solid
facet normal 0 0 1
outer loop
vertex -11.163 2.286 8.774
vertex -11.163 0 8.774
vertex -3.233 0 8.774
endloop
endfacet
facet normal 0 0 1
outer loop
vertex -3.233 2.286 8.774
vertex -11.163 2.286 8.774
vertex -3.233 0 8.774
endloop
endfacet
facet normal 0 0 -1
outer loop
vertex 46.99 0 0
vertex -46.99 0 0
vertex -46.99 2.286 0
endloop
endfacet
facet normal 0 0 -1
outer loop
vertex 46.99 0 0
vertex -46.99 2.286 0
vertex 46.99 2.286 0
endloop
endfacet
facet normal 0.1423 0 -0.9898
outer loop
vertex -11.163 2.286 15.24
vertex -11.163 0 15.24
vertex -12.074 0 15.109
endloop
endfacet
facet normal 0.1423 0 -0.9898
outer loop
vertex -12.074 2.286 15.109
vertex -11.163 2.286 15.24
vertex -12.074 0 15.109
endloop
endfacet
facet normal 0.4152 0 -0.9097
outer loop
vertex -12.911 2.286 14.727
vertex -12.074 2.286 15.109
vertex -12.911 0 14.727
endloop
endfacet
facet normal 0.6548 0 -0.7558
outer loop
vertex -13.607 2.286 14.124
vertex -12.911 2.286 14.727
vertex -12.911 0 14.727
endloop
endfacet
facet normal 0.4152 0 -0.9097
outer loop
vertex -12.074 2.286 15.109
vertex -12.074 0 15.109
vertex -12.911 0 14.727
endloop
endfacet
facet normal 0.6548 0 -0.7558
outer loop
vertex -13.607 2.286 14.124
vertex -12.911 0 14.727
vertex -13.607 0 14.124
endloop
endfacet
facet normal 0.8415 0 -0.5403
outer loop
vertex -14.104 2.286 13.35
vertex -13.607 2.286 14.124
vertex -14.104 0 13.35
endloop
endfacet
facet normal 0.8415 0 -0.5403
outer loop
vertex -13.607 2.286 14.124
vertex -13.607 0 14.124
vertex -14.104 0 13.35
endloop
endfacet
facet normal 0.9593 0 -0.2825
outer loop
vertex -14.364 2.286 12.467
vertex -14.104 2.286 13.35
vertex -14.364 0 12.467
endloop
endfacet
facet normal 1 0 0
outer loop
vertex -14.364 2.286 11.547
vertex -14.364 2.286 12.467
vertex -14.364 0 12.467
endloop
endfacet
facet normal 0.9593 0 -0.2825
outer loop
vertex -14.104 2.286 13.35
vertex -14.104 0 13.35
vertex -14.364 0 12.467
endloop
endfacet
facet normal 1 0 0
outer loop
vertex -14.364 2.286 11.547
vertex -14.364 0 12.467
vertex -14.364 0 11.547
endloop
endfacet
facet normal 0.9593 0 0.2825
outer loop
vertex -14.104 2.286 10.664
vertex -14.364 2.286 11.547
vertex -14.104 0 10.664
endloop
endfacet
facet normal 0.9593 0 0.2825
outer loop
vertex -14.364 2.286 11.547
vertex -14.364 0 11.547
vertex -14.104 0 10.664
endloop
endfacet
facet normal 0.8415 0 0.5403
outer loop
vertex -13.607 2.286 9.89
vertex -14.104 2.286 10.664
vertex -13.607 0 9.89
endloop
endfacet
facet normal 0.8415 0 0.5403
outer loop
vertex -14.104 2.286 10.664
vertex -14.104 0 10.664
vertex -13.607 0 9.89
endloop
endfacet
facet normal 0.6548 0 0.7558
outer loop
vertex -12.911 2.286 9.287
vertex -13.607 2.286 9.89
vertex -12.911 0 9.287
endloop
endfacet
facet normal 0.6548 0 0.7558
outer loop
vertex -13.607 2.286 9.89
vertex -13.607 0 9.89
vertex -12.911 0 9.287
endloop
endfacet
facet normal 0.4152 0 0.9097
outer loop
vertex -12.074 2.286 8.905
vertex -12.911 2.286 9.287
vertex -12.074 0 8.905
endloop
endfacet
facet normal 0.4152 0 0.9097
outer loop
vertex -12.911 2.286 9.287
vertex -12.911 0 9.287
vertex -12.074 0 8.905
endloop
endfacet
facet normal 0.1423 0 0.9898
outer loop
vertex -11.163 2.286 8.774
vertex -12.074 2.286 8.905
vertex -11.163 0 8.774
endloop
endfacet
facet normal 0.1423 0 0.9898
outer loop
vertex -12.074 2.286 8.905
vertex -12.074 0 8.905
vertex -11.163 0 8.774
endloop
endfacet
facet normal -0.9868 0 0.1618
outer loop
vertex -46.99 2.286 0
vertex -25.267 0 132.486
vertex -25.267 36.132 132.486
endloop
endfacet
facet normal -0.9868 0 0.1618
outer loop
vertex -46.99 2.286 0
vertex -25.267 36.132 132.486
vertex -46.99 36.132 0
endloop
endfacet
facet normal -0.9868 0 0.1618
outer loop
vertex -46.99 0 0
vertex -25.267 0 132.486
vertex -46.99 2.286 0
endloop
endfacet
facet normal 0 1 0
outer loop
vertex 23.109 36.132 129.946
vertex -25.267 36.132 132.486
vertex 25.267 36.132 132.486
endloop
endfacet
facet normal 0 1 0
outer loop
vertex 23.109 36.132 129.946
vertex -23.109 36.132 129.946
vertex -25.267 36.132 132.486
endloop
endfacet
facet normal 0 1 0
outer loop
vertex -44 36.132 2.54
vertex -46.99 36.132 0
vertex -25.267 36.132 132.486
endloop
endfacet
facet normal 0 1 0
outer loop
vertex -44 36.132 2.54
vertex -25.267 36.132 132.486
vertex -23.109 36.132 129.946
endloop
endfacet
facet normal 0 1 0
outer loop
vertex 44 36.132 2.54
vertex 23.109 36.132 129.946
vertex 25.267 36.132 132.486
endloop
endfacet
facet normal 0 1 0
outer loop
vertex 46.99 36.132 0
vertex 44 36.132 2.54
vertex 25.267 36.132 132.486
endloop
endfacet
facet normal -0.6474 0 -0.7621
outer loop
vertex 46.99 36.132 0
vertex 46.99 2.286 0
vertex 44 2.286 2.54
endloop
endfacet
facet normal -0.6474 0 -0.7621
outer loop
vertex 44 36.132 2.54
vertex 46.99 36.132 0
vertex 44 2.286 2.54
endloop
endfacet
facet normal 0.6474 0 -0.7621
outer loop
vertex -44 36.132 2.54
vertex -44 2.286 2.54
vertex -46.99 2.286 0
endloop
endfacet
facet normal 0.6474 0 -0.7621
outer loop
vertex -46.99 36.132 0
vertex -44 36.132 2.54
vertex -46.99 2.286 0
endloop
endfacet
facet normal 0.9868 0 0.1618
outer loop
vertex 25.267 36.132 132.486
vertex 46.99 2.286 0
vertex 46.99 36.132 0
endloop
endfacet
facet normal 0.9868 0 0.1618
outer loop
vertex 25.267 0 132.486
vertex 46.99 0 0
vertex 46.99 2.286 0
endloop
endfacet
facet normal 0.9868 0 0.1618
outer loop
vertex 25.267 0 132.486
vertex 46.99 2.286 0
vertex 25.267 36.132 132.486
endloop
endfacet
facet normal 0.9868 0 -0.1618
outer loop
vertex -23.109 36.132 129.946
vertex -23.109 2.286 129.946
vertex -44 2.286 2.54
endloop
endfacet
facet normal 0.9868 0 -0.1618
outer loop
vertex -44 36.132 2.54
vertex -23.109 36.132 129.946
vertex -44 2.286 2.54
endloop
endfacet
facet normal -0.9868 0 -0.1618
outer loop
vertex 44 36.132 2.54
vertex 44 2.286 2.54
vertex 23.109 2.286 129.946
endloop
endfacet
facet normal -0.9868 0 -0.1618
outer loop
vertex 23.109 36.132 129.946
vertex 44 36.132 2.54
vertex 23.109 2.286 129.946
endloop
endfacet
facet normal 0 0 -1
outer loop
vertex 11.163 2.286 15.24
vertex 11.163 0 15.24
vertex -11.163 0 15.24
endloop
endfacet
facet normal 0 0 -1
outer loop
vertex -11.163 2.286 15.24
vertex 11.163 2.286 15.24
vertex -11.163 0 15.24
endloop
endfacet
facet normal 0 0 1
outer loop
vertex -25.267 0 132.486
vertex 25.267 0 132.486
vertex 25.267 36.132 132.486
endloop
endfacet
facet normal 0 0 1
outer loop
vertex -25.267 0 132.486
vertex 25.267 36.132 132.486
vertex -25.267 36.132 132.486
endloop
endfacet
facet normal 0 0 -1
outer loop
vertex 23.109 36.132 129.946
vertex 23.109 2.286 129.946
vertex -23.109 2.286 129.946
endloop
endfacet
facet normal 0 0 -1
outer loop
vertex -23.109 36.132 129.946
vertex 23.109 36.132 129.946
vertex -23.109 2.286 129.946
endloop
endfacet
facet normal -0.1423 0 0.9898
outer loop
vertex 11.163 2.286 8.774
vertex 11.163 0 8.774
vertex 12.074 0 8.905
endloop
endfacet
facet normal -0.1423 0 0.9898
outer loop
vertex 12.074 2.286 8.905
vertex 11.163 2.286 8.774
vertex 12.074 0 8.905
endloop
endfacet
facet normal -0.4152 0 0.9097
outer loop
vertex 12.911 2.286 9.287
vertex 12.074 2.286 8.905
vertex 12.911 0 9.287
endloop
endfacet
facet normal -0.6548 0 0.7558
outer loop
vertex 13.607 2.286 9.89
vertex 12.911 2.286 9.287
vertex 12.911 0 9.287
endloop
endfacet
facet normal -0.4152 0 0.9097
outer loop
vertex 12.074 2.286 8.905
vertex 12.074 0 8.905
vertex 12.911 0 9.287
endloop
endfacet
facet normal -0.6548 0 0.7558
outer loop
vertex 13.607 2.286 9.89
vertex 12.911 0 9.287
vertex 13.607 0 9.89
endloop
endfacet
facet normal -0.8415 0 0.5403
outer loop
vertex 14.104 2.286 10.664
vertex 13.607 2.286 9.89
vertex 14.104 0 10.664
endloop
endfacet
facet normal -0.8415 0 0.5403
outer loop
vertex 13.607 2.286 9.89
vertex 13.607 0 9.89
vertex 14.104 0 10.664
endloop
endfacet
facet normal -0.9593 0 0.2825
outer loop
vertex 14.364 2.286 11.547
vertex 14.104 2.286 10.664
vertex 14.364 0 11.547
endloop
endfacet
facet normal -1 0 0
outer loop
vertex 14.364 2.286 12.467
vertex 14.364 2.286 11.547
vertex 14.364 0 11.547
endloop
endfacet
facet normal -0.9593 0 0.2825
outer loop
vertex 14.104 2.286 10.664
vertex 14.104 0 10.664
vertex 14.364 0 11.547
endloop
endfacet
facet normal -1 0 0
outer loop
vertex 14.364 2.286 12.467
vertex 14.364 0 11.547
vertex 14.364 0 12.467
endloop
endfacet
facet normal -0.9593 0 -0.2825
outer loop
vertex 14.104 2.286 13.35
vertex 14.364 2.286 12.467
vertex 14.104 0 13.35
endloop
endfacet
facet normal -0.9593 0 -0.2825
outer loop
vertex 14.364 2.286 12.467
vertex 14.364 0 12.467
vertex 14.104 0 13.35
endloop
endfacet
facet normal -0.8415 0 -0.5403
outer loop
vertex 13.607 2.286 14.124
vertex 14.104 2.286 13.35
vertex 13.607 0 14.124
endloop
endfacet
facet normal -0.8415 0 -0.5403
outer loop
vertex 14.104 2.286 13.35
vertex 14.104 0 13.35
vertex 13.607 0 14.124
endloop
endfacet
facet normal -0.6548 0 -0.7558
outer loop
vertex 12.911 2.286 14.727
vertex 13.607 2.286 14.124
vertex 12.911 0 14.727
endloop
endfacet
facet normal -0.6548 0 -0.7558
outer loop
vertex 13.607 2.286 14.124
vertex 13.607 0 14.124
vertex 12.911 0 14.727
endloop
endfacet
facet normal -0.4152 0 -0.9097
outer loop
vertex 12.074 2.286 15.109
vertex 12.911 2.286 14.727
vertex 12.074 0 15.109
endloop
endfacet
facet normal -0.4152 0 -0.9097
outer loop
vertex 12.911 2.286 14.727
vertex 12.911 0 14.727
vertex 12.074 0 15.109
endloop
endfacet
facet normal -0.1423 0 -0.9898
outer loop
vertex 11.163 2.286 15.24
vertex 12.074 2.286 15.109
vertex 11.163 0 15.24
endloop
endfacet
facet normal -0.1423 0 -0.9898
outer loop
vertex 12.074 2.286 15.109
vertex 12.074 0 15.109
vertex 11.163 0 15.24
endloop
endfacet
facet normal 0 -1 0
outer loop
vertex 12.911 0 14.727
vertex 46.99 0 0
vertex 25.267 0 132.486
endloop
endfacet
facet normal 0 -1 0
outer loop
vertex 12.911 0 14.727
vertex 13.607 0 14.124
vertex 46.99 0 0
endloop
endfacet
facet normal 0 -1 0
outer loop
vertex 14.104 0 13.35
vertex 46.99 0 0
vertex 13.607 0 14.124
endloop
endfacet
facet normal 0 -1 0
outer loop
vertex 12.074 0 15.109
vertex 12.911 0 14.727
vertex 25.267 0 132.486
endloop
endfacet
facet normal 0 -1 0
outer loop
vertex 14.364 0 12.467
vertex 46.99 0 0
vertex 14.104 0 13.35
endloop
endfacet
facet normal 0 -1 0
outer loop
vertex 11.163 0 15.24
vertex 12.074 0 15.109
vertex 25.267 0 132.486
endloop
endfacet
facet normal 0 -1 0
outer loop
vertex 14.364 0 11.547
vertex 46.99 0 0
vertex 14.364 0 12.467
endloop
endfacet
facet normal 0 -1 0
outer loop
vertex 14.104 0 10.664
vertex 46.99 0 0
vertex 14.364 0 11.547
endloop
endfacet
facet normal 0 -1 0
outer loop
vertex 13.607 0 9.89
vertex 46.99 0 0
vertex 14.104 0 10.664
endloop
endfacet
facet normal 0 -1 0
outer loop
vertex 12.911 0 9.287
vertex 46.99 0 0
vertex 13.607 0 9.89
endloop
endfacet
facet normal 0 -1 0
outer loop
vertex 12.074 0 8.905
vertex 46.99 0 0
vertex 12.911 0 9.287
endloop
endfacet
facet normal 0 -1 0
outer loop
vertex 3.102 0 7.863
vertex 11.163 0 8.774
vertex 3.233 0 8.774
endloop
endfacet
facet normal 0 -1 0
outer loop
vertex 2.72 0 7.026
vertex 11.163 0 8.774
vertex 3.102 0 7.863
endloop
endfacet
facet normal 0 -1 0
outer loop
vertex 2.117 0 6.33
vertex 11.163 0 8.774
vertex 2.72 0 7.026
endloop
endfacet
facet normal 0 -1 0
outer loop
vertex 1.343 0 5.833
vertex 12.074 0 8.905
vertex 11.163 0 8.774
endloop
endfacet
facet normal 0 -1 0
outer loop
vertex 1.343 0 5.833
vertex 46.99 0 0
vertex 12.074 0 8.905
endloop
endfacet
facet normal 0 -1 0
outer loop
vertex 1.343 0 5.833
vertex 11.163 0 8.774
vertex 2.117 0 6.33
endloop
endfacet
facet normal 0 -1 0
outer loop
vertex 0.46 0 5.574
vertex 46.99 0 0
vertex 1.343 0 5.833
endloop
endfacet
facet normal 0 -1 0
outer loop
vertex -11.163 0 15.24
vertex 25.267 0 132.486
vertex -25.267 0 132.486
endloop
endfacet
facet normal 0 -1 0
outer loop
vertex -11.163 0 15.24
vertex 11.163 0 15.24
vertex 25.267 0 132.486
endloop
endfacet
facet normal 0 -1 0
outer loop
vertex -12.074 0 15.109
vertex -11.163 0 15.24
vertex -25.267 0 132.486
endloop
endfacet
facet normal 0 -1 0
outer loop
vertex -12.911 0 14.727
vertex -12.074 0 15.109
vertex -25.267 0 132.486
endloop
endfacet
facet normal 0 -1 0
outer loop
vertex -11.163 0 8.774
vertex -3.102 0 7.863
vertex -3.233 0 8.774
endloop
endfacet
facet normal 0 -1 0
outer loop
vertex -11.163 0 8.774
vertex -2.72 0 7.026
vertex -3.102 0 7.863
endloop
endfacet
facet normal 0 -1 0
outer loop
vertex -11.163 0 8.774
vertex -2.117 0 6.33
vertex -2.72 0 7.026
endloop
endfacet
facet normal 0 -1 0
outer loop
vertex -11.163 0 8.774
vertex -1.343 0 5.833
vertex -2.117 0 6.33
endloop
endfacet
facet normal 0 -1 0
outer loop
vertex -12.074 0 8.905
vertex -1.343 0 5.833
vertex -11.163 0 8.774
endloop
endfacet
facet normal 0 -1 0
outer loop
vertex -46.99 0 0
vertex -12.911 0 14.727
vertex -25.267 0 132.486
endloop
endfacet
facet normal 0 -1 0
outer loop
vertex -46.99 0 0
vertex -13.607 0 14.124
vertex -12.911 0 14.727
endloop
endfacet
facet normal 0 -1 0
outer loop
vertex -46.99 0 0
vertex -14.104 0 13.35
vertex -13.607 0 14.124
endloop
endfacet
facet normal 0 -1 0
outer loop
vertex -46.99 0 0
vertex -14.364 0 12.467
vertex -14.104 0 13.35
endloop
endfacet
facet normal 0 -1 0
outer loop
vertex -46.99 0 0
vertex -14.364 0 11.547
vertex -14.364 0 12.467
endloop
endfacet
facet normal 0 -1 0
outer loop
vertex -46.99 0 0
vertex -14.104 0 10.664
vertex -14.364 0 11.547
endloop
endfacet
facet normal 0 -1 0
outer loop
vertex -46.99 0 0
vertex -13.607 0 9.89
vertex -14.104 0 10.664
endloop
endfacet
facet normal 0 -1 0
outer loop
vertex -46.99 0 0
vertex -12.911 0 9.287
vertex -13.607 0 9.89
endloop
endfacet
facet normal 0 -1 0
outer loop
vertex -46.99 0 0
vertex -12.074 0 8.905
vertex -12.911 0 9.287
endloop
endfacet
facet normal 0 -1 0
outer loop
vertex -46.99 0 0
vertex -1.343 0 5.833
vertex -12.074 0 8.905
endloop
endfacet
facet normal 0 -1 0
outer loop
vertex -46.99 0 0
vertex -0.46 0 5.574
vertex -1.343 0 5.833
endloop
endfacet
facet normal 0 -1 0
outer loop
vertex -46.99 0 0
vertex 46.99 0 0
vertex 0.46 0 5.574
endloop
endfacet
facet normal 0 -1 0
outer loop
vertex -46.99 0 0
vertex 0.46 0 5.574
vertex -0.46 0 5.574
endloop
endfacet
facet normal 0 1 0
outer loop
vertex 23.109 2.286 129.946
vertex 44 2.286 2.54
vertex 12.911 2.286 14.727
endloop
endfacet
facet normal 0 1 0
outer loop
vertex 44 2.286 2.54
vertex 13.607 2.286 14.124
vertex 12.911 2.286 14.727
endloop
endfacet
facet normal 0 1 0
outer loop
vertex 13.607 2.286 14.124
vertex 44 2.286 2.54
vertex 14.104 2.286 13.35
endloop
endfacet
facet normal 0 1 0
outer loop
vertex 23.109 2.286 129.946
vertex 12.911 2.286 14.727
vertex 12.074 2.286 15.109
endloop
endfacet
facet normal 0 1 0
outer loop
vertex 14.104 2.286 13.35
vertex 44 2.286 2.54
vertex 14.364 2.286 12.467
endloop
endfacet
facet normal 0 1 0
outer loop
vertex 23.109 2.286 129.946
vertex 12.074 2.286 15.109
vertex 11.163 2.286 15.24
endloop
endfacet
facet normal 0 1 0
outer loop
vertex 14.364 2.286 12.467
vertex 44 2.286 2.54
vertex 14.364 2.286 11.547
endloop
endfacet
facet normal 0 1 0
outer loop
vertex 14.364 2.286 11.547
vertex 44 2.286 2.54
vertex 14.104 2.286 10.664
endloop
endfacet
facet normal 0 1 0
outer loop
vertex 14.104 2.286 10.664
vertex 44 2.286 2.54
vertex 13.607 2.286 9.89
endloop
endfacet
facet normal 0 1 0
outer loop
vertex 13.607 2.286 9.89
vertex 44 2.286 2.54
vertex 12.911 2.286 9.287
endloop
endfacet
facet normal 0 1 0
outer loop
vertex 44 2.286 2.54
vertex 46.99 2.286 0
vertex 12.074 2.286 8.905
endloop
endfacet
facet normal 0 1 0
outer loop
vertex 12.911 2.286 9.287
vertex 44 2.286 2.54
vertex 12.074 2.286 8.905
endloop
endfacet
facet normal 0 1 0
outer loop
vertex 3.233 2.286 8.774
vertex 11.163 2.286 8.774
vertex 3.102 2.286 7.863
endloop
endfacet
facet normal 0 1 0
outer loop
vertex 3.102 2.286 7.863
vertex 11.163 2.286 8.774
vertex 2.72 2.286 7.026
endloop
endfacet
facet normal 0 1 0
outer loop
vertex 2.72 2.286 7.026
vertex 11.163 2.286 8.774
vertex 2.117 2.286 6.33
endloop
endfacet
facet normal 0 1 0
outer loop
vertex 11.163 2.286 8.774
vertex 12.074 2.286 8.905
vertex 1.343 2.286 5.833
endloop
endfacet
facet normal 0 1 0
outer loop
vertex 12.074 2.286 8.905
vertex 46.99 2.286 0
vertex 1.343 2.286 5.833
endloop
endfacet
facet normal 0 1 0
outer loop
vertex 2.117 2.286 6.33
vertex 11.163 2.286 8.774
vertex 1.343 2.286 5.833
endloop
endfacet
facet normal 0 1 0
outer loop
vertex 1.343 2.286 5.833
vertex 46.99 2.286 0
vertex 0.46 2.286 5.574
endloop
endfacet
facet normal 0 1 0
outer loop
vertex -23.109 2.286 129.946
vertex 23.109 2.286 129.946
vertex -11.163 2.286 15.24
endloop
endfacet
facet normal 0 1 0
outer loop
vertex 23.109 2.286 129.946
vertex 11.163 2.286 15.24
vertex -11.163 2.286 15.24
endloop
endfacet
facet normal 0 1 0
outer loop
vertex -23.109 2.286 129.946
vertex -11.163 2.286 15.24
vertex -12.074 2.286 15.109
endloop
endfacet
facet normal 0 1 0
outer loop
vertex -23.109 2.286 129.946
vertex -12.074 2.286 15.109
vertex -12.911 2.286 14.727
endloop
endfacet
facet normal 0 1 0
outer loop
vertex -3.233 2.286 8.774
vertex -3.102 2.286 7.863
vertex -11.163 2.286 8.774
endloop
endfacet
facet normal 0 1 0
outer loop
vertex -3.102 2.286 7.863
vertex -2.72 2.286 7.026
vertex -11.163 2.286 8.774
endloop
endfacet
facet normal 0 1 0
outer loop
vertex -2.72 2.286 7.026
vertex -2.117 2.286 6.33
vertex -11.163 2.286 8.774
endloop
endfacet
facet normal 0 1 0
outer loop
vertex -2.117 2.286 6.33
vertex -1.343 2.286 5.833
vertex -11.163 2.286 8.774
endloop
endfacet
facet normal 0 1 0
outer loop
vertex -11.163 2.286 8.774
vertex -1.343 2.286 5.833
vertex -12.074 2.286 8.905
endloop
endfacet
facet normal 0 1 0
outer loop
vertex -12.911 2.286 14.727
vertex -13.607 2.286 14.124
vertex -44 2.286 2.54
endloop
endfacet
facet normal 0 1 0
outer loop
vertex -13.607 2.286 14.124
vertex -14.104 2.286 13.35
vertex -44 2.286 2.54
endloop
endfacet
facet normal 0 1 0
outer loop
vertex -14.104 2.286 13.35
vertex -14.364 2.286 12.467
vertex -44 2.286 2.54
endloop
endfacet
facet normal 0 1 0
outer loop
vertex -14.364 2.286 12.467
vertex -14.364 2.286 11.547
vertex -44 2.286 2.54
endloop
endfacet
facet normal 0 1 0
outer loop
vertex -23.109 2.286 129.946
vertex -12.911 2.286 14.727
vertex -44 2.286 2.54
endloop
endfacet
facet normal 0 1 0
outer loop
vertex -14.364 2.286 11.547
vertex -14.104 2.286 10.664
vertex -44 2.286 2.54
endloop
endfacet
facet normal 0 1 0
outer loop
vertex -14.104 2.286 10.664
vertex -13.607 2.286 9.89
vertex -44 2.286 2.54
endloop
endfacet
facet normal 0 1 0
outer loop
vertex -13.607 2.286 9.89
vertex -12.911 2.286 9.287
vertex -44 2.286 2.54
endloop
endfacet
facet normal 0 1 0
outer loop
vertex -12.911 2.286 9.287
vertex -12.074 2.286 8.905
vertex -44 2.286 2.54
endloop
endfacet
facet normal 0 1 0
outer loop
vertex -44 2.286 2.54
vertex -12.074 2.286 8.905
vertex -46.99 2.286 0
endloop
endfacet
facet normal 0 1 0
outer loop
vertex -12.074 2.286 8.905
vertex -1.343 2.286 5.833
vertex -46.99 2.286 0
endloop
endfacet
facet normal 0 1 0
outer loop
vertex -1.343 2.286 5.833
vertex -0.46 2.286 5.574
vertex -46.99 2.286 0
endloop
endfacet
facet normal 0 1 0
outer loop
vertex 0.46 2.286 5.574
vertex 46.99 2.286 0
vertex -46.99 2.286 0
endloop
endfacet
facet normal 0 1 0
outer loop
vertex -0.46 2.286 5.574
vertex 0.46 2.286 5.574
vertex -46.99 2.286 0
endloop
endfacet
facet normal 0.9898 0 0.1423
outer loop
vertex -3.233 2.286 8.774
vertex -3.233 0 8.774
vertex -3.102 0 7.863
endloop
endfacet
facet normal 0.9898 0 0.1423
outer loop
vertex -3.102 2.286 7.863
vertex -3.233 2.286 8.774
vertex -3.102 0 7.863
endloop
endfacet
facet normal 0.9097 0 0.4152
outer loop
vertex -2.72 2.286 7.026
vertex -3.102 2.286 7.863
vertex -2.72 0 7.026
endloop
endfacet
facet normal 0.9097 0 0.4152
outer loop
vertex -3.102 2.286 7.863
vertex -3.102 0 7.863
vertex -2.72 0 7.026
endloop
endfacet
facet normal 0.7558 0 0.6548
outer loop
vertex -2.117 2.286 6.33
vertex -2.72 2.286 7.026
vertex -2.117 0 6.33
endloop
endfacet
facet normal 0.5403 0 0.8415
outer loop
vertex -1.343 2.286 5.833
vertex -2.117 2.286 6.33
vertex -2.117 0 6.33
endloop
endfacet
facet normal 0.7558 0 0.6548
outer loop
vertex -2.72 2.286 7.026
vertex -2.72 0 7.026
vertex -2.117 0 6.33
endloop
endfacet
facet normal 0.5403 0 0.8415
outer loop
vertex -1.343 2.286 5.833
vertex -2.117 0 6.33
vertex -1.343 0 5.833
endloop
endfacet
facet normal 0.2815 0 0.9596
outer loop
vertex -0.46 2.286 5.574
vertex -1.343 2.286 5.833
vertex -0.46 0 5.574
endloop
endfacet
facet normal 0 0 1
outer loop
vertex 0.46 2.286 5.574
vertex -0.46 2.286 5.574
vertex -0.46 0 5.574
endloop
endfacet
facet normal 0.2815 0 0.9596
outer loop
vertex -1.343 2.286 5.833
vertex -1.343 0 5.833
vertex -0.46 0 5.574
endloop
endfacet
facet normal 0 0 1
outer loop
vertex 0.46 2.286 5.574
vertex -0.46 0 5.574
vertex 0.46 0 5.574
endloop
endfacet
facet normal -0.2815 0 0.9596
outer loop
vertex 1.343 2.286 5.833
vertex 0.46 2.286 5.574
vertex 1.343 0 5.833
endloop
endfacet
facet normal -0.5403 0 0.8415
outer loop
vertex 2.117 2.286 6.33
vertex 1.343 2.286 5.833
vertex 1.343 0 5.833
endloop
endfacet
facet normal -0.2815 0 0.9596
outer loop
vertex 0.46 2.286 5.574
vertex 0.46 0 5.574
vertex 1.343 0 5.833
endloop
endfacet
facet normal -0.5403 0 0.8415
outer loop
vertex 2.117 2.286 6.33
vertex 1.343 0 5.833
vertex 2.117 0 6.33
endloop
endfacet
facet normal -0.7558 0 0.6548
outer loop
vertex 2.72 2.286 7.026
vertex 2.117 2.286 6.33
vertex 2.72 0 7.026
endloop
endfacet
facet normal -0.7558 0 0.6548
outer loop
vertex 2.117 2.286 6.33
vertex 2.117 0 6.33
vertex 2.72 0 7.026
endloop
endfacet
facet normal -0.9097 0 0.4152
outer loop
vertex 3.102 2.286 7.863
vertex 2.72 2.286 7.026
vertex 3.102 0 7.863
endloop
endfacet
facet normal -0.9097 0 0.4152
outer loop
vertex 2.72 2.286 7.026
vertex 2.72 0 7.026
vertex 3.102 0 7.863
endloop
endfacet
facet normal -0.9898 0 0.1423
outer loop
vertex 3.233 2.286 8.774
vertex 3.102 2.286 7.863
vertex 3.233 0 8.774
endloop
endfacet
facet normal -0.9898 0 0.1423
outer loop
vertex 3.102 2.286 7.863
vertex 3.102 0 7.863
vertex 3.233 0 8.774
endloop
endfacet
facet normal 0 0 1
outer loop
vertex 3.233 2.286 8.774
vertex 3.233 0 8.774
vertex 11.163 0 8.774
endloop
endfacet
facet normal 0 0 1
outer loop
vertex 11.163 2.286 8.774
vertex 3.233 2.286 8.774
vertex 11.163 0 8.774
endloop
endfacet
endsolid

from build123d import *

# Parameters (mm, degrees)
BASE_DEPTH  = 2.286
WALLS_DEPTH = 36.1315


with BuildPart() as part:
    # Sketch1 → Base (new body)
    with BuildSketch(Plane(origin=(0, 0, 0), x_dir=(1, 0, 0), z_dir=(0, 1, 0))):
        Polygon((25.26665, -132.4864), (46.99, 0), (-46.99, 0), (-25.26665, -132.4864), align=None)
        with BuildLine():
            ThreePointArc((11.1633, -8.773780407), (14.396409796, -12.006890204), (11.1633, -15.24))
            Line((11.1633, -15.24), (-11.1633, -15.24))
            ThreePointArc((-11.1633, -15.24), (-14.396409796, -12.006890204), (-11.1633, -8.773780407))
            Line((-11.1633, -8.773780407), (-3.233109796, -8.773780407))
            ThreePointArc((-3.233109796, -8.773780407), (0, -5.540670611), (3.233109796, -8.773780407))
            Line((3.233109796, -8.773780407), (11.1633, -8.773780407))
        make_face(mode=Mode.SUBTRACT)
    extrude(amount=BASE_DEPTH)

    # Sketch1<4> → Walls (add)
    with BuildSketch(Plane(origin=(0, 0, 0), x_dir=(1, 0, 0), z_dir=(0, 1, 0))):
        Polygon((-43.999607163, -2.54), (-46.99, 0), (-25.26665, -132.4864), (25.26665, -132.4864), (46.99, 0), (43.999607163, -2.54), (23.1092077, -129.9464), (-23.1092077, -129.9464), align=None)
    extrude(amount=WALLS_DEPTH)


solid = part.part
